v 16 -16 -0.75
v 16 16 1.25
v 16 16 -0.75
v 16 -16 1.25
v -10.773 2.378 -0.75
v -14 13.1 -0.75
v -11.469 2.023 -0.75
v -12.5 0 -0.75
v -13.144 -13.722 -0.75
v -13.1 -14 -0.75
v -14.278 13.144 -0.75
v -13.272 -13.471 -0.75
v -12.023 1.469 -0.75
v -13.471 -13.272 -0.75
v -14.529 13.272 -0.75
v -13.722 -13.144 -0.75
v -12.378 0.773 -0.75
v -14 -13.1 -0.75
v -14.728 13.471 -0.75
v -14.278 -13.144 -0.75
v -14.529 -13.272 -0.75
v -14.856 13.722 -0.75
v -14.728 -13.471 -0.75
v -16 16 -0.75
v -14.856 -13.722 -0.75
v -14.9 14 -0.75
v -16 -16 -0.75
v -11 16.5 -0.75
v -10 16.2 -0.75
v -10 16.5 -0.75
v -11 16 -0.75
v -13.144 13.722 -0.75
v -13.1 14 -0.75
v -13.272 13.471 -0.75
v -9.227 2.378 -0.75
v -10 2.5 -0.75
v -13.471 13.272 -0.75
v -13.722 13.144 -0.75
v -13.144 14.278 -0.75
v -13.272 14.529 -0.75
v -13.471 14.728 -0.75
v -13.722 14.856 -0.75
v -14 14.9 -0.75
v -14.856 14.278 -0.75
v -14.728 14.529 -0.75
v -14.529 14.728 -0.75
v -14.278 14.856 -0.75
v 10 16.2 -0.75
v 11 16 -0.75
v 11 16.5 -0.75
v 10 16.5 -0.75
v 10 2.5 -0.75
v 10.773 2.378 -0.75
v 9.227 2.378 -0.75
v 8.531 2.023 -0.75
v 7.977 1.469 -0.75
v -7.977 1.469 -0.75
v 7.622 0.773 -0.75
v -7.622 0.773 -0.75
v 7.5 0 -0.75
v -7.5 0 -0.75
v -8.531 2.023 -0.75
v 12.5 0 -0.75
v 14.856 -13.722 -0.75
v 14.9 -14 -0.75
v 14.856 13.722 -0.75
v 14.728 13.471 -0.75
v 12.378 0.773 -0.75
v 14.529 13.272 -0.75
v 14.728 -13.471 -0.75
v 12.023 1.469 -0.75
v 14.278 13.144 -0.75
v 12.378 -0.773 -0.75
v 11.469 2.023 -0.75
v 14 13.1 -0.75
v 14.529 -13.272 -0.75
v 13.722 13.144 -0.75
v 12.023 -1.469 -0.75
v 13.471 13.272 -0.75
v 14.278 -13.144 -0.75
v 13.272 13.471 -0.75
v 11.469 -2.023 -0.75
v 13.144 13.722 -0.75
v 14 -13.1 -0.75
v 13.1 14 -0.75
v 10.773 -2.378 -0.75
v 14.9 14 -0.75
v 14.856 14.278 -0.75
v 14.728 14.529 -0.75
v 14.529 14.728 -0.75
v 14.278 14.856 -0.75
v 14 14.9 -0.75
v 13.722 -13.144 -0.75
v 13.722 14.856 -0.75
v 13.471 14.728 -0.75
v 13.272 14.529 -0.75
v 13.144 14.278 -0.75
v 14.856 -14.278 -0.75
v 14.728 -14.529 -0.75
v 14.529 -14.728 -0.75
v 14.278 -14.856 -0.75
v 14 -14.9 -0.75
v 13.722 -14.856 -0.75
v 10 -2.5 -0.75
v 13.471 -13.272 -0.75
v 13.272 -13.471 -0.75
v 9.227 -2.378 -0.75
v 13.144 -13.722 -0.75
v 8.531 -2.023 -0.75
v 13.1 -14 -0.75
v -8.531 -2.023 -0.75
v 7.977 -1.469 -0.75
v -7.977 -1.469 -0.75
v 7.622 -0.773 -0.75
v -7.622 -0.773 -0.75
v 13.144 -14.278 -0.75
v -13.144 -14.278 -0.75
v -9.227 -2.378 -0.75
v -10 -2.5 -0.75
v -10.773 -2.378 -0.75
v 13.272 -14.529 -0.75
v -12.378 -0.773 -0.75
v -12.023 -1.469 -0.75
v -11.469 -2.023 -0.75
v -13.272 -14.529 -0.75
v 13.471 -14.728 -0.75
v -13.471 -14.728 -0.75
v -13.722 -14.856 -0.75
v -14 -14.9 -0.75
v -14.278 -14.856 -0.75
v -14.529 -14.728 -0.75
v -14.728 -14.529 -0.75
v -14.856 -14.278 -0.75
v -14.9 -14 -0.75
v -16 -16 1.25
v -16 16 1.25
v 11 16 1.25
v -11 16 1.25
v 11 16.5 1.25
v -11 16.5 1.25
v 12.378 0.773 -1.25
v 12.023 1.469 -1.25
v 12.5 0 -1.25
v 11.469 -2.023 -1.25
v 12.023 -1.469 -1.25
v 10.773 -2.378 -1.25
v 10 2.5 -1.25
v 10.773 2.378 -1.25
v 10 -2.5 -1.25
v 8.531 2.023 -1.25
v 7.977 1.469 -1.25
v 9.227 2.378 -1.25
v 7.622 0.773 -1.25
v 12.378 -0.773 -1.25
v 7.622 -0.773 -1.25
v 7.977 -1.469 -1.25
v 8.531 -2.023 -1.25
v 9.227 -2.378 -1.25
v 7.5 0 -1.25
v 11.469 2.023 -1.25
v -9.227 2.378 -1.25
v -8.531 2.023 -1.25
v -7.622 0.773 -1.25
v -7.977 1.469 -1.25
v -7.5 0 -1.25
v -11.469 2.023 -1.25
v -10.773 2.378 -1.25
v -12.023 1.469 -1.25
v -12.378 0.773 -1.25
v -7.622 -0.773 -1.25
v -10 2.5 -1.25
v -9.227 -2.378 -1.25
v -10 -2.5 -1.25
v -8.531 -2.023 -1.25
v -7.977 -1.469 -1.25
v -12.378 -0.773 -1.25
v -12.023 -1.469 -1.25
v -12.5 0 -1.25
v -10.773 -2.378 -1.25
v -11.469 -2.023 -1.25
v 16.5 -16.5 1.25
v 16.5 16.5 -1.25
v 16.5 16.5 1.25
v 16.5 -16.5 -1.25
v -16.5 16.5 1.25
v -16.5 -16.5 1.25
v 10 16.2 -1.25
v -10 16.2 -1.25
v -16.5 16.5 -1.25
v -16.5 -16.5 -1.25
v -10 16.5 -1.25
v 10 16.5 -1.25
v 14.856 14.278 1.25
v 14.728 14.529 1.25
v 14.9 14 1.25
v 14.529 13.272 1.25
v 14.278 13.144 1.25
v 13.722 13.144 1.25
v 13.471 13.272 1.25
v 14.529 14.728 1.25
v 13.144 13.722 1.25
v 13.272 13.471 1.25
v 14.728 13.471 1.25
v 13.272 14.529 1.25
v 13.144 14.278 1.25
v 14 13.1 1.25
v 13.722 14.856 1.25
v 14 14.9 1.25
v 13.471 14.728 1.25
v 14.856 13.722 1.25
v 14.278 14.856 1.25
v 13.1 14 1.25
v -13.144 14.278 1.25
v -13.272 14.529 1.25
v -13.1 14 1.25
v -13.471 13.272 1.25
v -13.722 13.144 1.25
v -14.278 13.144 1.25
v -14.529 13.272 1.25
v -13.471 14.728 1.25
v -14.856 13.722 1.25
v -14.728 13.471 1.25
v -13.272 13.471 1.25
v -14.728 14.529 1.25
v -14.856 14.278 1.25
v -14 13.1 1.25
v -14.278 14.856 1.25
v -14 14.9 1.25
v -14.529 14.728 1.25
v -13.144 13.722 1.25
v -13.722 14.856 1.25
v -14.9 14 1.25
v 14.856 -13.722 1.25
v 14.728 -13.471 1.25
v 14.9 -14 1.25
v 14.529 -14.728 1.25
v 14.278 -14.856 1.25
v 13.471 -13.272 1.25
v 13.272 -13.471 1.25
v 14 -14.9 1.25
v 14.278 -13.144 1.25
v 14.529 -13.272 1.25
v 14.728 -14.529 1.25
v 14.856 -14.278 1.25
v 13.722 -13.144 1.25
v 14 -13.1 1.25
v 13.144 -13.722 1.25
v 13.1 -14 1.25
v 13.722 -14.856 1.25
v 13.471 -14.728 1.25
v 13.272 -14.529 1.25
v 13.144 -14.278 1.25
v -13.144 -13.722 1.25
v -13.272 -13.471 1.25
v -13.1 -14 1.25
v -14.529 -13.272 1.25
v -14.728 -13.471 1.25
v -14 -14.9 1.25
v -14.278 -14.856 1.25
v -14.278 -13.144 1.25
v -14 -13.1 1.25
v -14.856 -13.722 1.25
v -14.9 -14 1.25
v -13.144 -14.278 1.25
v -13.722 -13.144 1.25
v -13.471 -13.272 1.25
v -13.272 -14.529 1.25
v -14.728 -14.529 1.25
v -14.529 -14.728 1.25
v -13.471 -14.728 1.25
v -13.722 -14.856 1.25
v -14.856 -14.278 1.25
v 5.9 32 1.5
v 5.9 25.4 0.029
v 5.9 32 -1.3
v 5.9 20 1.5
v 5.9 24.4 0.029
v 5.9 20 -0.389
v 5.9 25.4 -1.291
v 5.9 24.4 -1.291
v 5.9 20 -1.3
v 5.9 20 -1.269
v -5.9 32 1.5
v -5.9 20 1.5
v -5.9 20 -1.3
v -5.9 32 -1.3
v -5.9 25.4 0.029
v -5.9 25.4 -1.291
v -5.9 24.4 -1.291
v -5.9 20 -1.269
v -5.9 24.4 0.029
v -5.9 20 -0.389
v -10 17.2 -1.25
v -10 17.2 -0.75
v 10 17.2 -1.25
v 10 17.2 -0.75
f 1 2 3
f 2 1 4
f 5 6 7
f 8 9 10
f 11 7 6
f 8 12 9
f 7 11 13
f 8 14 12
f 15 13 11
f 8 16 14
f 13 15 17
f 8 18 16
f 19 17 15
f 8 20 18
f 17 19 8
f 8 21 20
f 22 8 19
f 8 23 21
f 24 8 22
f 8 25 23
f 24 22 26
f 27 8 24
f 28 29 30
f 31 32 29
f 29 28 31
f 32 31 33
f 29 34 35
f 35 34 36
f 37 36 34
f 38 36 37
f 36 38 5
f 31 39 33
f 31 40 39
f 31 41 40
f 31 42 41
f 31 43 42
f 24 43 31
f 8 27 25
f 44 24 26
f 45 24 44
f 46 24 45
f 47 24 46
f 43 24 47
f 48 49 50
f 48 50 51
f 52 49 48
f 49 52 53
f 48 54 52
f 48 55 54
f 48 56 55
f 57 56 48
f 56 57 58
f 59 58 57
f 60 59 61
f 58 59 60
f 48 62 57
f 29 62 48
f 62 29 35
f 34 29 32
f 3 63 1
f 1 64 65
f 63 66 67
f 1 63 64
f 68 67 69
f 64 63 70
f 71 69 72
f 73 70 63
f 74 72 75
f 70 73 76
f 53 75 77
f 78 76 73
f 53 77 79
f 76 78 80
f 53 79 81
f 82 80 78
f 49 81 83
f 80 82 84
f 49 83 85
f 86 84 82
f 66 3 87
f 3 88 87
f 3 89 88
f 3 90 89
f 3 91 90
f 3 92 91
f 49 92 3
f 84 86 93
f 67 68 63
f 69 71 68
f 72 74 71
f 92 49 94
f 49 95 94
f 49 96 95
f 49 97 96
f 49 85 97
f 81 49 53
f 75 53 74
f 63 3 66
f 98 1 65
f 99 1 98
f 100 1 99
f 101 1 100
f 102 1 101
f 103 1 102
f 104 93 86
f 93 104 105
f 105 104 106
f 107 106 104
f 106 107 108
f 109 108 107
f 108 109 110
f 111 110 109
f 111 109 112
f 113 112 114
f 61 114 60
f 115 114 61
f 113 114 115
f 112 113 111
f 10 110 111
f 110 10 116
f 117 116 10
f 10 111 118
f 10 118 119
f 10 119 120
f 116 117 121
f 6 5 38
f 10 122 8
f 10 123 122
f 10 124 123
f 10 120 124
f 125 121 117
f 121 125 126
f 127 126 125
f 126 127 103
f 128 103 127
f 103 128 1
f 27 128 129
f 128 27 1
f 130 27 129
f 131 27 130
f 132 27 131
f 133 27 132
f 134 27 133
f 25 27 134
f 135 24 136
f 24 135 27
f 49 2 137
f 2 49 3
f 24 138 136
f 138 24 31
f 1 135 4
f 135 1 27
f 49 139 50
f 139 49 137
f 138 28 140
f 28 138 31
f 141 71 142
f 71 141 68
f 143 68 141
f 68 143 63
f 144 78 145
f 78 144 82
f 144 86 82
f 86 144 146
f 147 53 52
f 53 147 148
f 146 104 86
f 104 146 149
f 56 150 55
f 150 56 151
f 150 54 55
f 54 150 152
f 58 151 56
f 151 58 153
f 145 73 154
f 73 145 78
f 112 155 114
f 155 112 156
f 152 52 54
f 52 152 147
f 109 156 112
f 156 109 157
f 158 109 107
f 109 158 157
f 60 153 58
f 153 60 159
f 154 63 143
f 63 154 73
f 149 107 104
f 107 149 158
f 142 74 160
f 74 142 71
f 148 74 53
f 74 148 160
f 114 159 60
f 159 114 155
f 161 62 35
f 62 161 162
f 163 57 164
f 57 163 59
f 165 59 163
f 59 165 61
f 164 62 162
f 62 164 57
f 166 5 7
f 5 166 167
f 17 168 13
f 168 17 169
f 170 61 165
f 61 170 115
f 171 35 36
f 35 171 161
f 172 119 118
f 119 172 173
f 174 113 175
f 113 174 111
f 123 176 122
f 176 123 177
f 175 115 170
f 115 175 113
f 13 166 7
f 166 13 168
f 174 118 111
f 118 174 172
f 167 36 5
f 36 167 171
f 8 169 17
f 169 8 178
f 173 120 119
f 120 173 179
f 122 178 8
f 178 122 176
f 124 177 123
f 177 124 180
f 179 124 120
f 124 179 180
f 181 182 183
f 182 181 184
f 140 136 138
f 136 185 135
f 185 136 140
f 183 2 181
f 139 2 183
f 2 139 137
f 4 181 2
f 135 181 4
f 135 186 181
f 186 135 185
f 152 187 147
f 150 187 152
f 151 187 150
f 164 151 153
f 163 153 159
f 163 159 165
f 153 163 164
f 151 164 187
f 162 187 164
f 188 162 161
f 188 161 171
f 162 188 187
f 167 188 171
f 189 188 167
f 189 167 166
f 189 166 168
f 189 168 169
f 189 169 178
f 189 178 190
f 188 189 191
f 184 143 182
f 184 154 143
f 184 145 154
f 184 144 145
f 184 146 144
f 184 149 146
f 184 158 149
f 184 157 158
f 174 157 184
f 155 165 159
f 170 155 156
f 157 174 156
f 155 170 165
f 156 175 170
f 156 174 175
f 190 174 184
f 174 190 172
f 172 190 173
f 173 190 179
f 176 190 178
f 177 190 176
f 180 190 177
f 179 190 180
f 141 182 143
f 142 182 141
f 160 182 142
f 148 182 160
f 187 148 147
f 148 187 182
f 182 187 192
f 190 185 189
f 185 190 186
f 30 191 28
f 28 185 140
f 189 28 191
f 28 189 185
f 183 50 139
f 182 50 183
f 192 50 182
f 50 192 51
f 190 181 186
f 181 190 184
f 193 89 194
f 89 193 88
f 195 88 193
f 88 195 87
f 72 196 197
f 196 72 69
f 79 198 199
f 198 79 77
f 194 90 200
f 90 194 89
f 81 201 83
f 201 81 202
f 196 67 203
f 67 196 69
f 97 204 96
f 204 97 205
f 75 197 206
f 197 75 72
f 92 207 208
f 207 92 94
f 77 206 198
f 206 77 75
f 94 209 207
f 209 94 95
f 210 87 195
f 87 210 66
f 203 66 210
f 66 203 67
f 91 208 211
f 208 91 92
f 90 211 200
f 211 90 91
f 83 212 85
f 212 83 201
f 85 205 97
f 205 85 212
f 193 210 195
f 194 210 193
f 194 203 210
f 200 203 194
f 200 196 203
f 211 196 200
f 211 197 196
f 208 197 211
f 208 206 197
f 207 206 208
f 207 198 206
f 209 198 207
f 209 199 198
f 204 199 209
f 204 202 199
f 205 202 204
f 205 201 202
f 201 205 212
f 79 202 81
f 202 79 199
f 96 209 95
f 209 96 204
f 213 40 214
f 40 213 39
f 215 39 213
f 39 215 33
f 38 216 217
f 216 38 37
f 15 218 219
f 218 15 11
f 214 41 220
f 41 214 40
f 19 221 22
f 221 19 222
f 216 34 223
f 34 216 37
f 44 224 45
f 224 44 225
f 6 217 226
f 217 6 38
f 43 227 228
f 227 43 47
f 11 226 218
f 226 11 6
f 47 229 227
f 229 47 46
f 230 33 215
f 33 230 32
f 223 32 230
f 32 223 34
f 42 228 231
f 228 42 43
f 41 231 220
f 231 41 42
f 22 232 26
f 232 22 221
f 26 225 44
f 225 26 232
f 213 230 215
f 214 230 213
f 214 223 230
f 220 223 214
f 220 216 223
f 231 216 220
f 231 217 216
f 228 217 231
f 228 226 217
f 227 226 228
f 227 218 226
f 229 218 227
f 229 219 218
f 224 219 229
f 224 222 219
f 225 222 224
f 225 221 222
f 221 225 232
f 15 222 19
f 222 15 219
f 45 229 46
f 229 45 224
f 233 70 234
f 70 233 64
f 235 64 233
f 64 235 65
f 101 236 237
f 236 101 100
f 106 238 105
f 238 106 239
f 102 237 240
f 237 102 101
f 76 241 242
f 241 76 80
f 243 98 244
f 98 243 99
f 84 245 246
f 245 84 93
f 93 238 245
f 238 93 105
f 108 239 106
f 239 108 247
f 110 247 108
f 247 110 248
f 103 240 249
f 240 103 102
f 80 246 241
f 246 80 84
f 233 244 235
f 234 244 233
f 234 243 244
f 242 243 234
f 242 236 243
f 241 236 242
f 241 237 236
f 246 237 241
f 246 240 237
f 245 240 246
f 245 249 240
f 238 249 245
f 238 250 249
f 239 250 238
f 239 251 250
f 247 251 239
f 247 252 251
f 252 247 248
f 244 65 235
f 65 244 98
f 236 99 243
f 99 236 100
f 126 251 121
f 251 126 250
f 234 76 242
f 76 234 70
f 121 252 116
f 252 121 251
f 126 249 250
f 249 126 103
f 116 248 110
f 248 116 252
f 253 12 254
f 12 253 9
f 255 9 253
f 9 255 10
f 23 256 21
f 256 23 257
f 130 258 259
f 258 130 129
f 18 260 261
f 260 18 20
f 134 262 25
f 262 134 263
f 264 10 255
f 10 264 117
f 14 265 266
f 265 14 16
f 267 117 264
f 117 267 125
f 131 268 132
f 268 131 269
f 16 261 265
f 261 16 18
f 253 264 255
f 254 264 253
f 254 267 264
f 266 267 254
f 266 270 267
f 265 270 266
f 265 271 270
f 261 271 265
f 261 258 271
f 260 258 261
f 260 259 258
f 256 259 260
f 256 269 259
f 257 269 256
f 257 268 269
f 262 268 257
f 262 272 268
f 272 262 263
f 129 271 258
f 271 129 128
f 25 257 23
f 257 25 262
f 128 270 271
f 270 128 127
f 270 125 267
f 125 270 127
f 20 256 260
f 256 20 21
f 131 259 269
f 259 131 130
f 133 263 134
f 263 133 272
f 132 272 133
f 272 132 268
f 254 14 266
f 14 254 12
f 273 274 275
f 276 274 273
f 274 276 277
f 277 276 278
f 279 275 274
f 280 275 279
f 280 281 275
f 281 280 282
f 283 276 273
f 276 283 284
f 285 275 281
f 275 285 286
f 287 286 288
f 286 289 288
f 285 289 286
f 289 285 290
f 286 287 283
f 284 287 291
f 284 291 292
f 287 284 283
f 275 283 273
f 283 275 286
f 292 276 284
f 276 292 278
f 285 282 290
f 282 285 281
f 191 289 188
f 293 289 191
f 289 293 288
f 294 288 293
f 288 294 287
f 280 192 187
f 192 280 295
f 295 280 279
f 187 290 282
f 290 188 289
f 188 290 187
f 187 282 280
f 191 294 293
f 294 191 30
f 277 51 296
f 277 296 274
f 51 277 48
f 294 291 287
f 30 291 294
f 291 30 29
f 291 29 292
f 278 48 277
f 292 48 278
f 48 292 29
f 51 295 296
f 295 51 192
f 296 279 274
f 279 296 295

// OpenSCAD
$fn=20;

translate([14, 14, 0]) cylinder(2.5, 0.9, 0.9, center=true);
translate([-14, 14, 0]) cylinder(2.5, 0.9, 0.9, center=true);
translate([14, -14, 0]) cylinder(2.5, 0.9, 0.9, center=true);
translate([-14, -14, 0]) cylinder(2.5, 0.9, 0.9, center=true);
difference() {
    union() {
        cube([33, 33, 2.5], center=true);
    }
    union() {
        translate([0, 0, .5]) cube([32, 32, 2.5], center=true);
        translate([0, 17, .5]) cube([22, 10, 2.5], center=true);
        translate([10, 0, 0]) cylinder(10, 2.5, 2.5, center=true);
        translate([-10, 0, 0]) cylinder(10, 2.5, 2.5, center=true);
    }
}
color("blue") translate([0, 26, 0.1]) cube([11.8, 12, 2.8], center=true);

color("green")
translate([0, 16.7, -1])
// --- hull()を使って角錐台を生成 ---
hull() {
    // 1. 底面の図形 (Z=0の位置)
    // 非常に薄い(0.01)立方体を配置します
    translate([0, 0, 0]) {
        cube([20, 1, .5], center = true);
    }
    
    // 2. 天面の図形 (Z=heightの位置)
    // 高さを変えて、もう一つの立方体を配置します
    translate([0, 10, .45]) {
        cube([10, 1, 1.5], center = true);
    }
}
